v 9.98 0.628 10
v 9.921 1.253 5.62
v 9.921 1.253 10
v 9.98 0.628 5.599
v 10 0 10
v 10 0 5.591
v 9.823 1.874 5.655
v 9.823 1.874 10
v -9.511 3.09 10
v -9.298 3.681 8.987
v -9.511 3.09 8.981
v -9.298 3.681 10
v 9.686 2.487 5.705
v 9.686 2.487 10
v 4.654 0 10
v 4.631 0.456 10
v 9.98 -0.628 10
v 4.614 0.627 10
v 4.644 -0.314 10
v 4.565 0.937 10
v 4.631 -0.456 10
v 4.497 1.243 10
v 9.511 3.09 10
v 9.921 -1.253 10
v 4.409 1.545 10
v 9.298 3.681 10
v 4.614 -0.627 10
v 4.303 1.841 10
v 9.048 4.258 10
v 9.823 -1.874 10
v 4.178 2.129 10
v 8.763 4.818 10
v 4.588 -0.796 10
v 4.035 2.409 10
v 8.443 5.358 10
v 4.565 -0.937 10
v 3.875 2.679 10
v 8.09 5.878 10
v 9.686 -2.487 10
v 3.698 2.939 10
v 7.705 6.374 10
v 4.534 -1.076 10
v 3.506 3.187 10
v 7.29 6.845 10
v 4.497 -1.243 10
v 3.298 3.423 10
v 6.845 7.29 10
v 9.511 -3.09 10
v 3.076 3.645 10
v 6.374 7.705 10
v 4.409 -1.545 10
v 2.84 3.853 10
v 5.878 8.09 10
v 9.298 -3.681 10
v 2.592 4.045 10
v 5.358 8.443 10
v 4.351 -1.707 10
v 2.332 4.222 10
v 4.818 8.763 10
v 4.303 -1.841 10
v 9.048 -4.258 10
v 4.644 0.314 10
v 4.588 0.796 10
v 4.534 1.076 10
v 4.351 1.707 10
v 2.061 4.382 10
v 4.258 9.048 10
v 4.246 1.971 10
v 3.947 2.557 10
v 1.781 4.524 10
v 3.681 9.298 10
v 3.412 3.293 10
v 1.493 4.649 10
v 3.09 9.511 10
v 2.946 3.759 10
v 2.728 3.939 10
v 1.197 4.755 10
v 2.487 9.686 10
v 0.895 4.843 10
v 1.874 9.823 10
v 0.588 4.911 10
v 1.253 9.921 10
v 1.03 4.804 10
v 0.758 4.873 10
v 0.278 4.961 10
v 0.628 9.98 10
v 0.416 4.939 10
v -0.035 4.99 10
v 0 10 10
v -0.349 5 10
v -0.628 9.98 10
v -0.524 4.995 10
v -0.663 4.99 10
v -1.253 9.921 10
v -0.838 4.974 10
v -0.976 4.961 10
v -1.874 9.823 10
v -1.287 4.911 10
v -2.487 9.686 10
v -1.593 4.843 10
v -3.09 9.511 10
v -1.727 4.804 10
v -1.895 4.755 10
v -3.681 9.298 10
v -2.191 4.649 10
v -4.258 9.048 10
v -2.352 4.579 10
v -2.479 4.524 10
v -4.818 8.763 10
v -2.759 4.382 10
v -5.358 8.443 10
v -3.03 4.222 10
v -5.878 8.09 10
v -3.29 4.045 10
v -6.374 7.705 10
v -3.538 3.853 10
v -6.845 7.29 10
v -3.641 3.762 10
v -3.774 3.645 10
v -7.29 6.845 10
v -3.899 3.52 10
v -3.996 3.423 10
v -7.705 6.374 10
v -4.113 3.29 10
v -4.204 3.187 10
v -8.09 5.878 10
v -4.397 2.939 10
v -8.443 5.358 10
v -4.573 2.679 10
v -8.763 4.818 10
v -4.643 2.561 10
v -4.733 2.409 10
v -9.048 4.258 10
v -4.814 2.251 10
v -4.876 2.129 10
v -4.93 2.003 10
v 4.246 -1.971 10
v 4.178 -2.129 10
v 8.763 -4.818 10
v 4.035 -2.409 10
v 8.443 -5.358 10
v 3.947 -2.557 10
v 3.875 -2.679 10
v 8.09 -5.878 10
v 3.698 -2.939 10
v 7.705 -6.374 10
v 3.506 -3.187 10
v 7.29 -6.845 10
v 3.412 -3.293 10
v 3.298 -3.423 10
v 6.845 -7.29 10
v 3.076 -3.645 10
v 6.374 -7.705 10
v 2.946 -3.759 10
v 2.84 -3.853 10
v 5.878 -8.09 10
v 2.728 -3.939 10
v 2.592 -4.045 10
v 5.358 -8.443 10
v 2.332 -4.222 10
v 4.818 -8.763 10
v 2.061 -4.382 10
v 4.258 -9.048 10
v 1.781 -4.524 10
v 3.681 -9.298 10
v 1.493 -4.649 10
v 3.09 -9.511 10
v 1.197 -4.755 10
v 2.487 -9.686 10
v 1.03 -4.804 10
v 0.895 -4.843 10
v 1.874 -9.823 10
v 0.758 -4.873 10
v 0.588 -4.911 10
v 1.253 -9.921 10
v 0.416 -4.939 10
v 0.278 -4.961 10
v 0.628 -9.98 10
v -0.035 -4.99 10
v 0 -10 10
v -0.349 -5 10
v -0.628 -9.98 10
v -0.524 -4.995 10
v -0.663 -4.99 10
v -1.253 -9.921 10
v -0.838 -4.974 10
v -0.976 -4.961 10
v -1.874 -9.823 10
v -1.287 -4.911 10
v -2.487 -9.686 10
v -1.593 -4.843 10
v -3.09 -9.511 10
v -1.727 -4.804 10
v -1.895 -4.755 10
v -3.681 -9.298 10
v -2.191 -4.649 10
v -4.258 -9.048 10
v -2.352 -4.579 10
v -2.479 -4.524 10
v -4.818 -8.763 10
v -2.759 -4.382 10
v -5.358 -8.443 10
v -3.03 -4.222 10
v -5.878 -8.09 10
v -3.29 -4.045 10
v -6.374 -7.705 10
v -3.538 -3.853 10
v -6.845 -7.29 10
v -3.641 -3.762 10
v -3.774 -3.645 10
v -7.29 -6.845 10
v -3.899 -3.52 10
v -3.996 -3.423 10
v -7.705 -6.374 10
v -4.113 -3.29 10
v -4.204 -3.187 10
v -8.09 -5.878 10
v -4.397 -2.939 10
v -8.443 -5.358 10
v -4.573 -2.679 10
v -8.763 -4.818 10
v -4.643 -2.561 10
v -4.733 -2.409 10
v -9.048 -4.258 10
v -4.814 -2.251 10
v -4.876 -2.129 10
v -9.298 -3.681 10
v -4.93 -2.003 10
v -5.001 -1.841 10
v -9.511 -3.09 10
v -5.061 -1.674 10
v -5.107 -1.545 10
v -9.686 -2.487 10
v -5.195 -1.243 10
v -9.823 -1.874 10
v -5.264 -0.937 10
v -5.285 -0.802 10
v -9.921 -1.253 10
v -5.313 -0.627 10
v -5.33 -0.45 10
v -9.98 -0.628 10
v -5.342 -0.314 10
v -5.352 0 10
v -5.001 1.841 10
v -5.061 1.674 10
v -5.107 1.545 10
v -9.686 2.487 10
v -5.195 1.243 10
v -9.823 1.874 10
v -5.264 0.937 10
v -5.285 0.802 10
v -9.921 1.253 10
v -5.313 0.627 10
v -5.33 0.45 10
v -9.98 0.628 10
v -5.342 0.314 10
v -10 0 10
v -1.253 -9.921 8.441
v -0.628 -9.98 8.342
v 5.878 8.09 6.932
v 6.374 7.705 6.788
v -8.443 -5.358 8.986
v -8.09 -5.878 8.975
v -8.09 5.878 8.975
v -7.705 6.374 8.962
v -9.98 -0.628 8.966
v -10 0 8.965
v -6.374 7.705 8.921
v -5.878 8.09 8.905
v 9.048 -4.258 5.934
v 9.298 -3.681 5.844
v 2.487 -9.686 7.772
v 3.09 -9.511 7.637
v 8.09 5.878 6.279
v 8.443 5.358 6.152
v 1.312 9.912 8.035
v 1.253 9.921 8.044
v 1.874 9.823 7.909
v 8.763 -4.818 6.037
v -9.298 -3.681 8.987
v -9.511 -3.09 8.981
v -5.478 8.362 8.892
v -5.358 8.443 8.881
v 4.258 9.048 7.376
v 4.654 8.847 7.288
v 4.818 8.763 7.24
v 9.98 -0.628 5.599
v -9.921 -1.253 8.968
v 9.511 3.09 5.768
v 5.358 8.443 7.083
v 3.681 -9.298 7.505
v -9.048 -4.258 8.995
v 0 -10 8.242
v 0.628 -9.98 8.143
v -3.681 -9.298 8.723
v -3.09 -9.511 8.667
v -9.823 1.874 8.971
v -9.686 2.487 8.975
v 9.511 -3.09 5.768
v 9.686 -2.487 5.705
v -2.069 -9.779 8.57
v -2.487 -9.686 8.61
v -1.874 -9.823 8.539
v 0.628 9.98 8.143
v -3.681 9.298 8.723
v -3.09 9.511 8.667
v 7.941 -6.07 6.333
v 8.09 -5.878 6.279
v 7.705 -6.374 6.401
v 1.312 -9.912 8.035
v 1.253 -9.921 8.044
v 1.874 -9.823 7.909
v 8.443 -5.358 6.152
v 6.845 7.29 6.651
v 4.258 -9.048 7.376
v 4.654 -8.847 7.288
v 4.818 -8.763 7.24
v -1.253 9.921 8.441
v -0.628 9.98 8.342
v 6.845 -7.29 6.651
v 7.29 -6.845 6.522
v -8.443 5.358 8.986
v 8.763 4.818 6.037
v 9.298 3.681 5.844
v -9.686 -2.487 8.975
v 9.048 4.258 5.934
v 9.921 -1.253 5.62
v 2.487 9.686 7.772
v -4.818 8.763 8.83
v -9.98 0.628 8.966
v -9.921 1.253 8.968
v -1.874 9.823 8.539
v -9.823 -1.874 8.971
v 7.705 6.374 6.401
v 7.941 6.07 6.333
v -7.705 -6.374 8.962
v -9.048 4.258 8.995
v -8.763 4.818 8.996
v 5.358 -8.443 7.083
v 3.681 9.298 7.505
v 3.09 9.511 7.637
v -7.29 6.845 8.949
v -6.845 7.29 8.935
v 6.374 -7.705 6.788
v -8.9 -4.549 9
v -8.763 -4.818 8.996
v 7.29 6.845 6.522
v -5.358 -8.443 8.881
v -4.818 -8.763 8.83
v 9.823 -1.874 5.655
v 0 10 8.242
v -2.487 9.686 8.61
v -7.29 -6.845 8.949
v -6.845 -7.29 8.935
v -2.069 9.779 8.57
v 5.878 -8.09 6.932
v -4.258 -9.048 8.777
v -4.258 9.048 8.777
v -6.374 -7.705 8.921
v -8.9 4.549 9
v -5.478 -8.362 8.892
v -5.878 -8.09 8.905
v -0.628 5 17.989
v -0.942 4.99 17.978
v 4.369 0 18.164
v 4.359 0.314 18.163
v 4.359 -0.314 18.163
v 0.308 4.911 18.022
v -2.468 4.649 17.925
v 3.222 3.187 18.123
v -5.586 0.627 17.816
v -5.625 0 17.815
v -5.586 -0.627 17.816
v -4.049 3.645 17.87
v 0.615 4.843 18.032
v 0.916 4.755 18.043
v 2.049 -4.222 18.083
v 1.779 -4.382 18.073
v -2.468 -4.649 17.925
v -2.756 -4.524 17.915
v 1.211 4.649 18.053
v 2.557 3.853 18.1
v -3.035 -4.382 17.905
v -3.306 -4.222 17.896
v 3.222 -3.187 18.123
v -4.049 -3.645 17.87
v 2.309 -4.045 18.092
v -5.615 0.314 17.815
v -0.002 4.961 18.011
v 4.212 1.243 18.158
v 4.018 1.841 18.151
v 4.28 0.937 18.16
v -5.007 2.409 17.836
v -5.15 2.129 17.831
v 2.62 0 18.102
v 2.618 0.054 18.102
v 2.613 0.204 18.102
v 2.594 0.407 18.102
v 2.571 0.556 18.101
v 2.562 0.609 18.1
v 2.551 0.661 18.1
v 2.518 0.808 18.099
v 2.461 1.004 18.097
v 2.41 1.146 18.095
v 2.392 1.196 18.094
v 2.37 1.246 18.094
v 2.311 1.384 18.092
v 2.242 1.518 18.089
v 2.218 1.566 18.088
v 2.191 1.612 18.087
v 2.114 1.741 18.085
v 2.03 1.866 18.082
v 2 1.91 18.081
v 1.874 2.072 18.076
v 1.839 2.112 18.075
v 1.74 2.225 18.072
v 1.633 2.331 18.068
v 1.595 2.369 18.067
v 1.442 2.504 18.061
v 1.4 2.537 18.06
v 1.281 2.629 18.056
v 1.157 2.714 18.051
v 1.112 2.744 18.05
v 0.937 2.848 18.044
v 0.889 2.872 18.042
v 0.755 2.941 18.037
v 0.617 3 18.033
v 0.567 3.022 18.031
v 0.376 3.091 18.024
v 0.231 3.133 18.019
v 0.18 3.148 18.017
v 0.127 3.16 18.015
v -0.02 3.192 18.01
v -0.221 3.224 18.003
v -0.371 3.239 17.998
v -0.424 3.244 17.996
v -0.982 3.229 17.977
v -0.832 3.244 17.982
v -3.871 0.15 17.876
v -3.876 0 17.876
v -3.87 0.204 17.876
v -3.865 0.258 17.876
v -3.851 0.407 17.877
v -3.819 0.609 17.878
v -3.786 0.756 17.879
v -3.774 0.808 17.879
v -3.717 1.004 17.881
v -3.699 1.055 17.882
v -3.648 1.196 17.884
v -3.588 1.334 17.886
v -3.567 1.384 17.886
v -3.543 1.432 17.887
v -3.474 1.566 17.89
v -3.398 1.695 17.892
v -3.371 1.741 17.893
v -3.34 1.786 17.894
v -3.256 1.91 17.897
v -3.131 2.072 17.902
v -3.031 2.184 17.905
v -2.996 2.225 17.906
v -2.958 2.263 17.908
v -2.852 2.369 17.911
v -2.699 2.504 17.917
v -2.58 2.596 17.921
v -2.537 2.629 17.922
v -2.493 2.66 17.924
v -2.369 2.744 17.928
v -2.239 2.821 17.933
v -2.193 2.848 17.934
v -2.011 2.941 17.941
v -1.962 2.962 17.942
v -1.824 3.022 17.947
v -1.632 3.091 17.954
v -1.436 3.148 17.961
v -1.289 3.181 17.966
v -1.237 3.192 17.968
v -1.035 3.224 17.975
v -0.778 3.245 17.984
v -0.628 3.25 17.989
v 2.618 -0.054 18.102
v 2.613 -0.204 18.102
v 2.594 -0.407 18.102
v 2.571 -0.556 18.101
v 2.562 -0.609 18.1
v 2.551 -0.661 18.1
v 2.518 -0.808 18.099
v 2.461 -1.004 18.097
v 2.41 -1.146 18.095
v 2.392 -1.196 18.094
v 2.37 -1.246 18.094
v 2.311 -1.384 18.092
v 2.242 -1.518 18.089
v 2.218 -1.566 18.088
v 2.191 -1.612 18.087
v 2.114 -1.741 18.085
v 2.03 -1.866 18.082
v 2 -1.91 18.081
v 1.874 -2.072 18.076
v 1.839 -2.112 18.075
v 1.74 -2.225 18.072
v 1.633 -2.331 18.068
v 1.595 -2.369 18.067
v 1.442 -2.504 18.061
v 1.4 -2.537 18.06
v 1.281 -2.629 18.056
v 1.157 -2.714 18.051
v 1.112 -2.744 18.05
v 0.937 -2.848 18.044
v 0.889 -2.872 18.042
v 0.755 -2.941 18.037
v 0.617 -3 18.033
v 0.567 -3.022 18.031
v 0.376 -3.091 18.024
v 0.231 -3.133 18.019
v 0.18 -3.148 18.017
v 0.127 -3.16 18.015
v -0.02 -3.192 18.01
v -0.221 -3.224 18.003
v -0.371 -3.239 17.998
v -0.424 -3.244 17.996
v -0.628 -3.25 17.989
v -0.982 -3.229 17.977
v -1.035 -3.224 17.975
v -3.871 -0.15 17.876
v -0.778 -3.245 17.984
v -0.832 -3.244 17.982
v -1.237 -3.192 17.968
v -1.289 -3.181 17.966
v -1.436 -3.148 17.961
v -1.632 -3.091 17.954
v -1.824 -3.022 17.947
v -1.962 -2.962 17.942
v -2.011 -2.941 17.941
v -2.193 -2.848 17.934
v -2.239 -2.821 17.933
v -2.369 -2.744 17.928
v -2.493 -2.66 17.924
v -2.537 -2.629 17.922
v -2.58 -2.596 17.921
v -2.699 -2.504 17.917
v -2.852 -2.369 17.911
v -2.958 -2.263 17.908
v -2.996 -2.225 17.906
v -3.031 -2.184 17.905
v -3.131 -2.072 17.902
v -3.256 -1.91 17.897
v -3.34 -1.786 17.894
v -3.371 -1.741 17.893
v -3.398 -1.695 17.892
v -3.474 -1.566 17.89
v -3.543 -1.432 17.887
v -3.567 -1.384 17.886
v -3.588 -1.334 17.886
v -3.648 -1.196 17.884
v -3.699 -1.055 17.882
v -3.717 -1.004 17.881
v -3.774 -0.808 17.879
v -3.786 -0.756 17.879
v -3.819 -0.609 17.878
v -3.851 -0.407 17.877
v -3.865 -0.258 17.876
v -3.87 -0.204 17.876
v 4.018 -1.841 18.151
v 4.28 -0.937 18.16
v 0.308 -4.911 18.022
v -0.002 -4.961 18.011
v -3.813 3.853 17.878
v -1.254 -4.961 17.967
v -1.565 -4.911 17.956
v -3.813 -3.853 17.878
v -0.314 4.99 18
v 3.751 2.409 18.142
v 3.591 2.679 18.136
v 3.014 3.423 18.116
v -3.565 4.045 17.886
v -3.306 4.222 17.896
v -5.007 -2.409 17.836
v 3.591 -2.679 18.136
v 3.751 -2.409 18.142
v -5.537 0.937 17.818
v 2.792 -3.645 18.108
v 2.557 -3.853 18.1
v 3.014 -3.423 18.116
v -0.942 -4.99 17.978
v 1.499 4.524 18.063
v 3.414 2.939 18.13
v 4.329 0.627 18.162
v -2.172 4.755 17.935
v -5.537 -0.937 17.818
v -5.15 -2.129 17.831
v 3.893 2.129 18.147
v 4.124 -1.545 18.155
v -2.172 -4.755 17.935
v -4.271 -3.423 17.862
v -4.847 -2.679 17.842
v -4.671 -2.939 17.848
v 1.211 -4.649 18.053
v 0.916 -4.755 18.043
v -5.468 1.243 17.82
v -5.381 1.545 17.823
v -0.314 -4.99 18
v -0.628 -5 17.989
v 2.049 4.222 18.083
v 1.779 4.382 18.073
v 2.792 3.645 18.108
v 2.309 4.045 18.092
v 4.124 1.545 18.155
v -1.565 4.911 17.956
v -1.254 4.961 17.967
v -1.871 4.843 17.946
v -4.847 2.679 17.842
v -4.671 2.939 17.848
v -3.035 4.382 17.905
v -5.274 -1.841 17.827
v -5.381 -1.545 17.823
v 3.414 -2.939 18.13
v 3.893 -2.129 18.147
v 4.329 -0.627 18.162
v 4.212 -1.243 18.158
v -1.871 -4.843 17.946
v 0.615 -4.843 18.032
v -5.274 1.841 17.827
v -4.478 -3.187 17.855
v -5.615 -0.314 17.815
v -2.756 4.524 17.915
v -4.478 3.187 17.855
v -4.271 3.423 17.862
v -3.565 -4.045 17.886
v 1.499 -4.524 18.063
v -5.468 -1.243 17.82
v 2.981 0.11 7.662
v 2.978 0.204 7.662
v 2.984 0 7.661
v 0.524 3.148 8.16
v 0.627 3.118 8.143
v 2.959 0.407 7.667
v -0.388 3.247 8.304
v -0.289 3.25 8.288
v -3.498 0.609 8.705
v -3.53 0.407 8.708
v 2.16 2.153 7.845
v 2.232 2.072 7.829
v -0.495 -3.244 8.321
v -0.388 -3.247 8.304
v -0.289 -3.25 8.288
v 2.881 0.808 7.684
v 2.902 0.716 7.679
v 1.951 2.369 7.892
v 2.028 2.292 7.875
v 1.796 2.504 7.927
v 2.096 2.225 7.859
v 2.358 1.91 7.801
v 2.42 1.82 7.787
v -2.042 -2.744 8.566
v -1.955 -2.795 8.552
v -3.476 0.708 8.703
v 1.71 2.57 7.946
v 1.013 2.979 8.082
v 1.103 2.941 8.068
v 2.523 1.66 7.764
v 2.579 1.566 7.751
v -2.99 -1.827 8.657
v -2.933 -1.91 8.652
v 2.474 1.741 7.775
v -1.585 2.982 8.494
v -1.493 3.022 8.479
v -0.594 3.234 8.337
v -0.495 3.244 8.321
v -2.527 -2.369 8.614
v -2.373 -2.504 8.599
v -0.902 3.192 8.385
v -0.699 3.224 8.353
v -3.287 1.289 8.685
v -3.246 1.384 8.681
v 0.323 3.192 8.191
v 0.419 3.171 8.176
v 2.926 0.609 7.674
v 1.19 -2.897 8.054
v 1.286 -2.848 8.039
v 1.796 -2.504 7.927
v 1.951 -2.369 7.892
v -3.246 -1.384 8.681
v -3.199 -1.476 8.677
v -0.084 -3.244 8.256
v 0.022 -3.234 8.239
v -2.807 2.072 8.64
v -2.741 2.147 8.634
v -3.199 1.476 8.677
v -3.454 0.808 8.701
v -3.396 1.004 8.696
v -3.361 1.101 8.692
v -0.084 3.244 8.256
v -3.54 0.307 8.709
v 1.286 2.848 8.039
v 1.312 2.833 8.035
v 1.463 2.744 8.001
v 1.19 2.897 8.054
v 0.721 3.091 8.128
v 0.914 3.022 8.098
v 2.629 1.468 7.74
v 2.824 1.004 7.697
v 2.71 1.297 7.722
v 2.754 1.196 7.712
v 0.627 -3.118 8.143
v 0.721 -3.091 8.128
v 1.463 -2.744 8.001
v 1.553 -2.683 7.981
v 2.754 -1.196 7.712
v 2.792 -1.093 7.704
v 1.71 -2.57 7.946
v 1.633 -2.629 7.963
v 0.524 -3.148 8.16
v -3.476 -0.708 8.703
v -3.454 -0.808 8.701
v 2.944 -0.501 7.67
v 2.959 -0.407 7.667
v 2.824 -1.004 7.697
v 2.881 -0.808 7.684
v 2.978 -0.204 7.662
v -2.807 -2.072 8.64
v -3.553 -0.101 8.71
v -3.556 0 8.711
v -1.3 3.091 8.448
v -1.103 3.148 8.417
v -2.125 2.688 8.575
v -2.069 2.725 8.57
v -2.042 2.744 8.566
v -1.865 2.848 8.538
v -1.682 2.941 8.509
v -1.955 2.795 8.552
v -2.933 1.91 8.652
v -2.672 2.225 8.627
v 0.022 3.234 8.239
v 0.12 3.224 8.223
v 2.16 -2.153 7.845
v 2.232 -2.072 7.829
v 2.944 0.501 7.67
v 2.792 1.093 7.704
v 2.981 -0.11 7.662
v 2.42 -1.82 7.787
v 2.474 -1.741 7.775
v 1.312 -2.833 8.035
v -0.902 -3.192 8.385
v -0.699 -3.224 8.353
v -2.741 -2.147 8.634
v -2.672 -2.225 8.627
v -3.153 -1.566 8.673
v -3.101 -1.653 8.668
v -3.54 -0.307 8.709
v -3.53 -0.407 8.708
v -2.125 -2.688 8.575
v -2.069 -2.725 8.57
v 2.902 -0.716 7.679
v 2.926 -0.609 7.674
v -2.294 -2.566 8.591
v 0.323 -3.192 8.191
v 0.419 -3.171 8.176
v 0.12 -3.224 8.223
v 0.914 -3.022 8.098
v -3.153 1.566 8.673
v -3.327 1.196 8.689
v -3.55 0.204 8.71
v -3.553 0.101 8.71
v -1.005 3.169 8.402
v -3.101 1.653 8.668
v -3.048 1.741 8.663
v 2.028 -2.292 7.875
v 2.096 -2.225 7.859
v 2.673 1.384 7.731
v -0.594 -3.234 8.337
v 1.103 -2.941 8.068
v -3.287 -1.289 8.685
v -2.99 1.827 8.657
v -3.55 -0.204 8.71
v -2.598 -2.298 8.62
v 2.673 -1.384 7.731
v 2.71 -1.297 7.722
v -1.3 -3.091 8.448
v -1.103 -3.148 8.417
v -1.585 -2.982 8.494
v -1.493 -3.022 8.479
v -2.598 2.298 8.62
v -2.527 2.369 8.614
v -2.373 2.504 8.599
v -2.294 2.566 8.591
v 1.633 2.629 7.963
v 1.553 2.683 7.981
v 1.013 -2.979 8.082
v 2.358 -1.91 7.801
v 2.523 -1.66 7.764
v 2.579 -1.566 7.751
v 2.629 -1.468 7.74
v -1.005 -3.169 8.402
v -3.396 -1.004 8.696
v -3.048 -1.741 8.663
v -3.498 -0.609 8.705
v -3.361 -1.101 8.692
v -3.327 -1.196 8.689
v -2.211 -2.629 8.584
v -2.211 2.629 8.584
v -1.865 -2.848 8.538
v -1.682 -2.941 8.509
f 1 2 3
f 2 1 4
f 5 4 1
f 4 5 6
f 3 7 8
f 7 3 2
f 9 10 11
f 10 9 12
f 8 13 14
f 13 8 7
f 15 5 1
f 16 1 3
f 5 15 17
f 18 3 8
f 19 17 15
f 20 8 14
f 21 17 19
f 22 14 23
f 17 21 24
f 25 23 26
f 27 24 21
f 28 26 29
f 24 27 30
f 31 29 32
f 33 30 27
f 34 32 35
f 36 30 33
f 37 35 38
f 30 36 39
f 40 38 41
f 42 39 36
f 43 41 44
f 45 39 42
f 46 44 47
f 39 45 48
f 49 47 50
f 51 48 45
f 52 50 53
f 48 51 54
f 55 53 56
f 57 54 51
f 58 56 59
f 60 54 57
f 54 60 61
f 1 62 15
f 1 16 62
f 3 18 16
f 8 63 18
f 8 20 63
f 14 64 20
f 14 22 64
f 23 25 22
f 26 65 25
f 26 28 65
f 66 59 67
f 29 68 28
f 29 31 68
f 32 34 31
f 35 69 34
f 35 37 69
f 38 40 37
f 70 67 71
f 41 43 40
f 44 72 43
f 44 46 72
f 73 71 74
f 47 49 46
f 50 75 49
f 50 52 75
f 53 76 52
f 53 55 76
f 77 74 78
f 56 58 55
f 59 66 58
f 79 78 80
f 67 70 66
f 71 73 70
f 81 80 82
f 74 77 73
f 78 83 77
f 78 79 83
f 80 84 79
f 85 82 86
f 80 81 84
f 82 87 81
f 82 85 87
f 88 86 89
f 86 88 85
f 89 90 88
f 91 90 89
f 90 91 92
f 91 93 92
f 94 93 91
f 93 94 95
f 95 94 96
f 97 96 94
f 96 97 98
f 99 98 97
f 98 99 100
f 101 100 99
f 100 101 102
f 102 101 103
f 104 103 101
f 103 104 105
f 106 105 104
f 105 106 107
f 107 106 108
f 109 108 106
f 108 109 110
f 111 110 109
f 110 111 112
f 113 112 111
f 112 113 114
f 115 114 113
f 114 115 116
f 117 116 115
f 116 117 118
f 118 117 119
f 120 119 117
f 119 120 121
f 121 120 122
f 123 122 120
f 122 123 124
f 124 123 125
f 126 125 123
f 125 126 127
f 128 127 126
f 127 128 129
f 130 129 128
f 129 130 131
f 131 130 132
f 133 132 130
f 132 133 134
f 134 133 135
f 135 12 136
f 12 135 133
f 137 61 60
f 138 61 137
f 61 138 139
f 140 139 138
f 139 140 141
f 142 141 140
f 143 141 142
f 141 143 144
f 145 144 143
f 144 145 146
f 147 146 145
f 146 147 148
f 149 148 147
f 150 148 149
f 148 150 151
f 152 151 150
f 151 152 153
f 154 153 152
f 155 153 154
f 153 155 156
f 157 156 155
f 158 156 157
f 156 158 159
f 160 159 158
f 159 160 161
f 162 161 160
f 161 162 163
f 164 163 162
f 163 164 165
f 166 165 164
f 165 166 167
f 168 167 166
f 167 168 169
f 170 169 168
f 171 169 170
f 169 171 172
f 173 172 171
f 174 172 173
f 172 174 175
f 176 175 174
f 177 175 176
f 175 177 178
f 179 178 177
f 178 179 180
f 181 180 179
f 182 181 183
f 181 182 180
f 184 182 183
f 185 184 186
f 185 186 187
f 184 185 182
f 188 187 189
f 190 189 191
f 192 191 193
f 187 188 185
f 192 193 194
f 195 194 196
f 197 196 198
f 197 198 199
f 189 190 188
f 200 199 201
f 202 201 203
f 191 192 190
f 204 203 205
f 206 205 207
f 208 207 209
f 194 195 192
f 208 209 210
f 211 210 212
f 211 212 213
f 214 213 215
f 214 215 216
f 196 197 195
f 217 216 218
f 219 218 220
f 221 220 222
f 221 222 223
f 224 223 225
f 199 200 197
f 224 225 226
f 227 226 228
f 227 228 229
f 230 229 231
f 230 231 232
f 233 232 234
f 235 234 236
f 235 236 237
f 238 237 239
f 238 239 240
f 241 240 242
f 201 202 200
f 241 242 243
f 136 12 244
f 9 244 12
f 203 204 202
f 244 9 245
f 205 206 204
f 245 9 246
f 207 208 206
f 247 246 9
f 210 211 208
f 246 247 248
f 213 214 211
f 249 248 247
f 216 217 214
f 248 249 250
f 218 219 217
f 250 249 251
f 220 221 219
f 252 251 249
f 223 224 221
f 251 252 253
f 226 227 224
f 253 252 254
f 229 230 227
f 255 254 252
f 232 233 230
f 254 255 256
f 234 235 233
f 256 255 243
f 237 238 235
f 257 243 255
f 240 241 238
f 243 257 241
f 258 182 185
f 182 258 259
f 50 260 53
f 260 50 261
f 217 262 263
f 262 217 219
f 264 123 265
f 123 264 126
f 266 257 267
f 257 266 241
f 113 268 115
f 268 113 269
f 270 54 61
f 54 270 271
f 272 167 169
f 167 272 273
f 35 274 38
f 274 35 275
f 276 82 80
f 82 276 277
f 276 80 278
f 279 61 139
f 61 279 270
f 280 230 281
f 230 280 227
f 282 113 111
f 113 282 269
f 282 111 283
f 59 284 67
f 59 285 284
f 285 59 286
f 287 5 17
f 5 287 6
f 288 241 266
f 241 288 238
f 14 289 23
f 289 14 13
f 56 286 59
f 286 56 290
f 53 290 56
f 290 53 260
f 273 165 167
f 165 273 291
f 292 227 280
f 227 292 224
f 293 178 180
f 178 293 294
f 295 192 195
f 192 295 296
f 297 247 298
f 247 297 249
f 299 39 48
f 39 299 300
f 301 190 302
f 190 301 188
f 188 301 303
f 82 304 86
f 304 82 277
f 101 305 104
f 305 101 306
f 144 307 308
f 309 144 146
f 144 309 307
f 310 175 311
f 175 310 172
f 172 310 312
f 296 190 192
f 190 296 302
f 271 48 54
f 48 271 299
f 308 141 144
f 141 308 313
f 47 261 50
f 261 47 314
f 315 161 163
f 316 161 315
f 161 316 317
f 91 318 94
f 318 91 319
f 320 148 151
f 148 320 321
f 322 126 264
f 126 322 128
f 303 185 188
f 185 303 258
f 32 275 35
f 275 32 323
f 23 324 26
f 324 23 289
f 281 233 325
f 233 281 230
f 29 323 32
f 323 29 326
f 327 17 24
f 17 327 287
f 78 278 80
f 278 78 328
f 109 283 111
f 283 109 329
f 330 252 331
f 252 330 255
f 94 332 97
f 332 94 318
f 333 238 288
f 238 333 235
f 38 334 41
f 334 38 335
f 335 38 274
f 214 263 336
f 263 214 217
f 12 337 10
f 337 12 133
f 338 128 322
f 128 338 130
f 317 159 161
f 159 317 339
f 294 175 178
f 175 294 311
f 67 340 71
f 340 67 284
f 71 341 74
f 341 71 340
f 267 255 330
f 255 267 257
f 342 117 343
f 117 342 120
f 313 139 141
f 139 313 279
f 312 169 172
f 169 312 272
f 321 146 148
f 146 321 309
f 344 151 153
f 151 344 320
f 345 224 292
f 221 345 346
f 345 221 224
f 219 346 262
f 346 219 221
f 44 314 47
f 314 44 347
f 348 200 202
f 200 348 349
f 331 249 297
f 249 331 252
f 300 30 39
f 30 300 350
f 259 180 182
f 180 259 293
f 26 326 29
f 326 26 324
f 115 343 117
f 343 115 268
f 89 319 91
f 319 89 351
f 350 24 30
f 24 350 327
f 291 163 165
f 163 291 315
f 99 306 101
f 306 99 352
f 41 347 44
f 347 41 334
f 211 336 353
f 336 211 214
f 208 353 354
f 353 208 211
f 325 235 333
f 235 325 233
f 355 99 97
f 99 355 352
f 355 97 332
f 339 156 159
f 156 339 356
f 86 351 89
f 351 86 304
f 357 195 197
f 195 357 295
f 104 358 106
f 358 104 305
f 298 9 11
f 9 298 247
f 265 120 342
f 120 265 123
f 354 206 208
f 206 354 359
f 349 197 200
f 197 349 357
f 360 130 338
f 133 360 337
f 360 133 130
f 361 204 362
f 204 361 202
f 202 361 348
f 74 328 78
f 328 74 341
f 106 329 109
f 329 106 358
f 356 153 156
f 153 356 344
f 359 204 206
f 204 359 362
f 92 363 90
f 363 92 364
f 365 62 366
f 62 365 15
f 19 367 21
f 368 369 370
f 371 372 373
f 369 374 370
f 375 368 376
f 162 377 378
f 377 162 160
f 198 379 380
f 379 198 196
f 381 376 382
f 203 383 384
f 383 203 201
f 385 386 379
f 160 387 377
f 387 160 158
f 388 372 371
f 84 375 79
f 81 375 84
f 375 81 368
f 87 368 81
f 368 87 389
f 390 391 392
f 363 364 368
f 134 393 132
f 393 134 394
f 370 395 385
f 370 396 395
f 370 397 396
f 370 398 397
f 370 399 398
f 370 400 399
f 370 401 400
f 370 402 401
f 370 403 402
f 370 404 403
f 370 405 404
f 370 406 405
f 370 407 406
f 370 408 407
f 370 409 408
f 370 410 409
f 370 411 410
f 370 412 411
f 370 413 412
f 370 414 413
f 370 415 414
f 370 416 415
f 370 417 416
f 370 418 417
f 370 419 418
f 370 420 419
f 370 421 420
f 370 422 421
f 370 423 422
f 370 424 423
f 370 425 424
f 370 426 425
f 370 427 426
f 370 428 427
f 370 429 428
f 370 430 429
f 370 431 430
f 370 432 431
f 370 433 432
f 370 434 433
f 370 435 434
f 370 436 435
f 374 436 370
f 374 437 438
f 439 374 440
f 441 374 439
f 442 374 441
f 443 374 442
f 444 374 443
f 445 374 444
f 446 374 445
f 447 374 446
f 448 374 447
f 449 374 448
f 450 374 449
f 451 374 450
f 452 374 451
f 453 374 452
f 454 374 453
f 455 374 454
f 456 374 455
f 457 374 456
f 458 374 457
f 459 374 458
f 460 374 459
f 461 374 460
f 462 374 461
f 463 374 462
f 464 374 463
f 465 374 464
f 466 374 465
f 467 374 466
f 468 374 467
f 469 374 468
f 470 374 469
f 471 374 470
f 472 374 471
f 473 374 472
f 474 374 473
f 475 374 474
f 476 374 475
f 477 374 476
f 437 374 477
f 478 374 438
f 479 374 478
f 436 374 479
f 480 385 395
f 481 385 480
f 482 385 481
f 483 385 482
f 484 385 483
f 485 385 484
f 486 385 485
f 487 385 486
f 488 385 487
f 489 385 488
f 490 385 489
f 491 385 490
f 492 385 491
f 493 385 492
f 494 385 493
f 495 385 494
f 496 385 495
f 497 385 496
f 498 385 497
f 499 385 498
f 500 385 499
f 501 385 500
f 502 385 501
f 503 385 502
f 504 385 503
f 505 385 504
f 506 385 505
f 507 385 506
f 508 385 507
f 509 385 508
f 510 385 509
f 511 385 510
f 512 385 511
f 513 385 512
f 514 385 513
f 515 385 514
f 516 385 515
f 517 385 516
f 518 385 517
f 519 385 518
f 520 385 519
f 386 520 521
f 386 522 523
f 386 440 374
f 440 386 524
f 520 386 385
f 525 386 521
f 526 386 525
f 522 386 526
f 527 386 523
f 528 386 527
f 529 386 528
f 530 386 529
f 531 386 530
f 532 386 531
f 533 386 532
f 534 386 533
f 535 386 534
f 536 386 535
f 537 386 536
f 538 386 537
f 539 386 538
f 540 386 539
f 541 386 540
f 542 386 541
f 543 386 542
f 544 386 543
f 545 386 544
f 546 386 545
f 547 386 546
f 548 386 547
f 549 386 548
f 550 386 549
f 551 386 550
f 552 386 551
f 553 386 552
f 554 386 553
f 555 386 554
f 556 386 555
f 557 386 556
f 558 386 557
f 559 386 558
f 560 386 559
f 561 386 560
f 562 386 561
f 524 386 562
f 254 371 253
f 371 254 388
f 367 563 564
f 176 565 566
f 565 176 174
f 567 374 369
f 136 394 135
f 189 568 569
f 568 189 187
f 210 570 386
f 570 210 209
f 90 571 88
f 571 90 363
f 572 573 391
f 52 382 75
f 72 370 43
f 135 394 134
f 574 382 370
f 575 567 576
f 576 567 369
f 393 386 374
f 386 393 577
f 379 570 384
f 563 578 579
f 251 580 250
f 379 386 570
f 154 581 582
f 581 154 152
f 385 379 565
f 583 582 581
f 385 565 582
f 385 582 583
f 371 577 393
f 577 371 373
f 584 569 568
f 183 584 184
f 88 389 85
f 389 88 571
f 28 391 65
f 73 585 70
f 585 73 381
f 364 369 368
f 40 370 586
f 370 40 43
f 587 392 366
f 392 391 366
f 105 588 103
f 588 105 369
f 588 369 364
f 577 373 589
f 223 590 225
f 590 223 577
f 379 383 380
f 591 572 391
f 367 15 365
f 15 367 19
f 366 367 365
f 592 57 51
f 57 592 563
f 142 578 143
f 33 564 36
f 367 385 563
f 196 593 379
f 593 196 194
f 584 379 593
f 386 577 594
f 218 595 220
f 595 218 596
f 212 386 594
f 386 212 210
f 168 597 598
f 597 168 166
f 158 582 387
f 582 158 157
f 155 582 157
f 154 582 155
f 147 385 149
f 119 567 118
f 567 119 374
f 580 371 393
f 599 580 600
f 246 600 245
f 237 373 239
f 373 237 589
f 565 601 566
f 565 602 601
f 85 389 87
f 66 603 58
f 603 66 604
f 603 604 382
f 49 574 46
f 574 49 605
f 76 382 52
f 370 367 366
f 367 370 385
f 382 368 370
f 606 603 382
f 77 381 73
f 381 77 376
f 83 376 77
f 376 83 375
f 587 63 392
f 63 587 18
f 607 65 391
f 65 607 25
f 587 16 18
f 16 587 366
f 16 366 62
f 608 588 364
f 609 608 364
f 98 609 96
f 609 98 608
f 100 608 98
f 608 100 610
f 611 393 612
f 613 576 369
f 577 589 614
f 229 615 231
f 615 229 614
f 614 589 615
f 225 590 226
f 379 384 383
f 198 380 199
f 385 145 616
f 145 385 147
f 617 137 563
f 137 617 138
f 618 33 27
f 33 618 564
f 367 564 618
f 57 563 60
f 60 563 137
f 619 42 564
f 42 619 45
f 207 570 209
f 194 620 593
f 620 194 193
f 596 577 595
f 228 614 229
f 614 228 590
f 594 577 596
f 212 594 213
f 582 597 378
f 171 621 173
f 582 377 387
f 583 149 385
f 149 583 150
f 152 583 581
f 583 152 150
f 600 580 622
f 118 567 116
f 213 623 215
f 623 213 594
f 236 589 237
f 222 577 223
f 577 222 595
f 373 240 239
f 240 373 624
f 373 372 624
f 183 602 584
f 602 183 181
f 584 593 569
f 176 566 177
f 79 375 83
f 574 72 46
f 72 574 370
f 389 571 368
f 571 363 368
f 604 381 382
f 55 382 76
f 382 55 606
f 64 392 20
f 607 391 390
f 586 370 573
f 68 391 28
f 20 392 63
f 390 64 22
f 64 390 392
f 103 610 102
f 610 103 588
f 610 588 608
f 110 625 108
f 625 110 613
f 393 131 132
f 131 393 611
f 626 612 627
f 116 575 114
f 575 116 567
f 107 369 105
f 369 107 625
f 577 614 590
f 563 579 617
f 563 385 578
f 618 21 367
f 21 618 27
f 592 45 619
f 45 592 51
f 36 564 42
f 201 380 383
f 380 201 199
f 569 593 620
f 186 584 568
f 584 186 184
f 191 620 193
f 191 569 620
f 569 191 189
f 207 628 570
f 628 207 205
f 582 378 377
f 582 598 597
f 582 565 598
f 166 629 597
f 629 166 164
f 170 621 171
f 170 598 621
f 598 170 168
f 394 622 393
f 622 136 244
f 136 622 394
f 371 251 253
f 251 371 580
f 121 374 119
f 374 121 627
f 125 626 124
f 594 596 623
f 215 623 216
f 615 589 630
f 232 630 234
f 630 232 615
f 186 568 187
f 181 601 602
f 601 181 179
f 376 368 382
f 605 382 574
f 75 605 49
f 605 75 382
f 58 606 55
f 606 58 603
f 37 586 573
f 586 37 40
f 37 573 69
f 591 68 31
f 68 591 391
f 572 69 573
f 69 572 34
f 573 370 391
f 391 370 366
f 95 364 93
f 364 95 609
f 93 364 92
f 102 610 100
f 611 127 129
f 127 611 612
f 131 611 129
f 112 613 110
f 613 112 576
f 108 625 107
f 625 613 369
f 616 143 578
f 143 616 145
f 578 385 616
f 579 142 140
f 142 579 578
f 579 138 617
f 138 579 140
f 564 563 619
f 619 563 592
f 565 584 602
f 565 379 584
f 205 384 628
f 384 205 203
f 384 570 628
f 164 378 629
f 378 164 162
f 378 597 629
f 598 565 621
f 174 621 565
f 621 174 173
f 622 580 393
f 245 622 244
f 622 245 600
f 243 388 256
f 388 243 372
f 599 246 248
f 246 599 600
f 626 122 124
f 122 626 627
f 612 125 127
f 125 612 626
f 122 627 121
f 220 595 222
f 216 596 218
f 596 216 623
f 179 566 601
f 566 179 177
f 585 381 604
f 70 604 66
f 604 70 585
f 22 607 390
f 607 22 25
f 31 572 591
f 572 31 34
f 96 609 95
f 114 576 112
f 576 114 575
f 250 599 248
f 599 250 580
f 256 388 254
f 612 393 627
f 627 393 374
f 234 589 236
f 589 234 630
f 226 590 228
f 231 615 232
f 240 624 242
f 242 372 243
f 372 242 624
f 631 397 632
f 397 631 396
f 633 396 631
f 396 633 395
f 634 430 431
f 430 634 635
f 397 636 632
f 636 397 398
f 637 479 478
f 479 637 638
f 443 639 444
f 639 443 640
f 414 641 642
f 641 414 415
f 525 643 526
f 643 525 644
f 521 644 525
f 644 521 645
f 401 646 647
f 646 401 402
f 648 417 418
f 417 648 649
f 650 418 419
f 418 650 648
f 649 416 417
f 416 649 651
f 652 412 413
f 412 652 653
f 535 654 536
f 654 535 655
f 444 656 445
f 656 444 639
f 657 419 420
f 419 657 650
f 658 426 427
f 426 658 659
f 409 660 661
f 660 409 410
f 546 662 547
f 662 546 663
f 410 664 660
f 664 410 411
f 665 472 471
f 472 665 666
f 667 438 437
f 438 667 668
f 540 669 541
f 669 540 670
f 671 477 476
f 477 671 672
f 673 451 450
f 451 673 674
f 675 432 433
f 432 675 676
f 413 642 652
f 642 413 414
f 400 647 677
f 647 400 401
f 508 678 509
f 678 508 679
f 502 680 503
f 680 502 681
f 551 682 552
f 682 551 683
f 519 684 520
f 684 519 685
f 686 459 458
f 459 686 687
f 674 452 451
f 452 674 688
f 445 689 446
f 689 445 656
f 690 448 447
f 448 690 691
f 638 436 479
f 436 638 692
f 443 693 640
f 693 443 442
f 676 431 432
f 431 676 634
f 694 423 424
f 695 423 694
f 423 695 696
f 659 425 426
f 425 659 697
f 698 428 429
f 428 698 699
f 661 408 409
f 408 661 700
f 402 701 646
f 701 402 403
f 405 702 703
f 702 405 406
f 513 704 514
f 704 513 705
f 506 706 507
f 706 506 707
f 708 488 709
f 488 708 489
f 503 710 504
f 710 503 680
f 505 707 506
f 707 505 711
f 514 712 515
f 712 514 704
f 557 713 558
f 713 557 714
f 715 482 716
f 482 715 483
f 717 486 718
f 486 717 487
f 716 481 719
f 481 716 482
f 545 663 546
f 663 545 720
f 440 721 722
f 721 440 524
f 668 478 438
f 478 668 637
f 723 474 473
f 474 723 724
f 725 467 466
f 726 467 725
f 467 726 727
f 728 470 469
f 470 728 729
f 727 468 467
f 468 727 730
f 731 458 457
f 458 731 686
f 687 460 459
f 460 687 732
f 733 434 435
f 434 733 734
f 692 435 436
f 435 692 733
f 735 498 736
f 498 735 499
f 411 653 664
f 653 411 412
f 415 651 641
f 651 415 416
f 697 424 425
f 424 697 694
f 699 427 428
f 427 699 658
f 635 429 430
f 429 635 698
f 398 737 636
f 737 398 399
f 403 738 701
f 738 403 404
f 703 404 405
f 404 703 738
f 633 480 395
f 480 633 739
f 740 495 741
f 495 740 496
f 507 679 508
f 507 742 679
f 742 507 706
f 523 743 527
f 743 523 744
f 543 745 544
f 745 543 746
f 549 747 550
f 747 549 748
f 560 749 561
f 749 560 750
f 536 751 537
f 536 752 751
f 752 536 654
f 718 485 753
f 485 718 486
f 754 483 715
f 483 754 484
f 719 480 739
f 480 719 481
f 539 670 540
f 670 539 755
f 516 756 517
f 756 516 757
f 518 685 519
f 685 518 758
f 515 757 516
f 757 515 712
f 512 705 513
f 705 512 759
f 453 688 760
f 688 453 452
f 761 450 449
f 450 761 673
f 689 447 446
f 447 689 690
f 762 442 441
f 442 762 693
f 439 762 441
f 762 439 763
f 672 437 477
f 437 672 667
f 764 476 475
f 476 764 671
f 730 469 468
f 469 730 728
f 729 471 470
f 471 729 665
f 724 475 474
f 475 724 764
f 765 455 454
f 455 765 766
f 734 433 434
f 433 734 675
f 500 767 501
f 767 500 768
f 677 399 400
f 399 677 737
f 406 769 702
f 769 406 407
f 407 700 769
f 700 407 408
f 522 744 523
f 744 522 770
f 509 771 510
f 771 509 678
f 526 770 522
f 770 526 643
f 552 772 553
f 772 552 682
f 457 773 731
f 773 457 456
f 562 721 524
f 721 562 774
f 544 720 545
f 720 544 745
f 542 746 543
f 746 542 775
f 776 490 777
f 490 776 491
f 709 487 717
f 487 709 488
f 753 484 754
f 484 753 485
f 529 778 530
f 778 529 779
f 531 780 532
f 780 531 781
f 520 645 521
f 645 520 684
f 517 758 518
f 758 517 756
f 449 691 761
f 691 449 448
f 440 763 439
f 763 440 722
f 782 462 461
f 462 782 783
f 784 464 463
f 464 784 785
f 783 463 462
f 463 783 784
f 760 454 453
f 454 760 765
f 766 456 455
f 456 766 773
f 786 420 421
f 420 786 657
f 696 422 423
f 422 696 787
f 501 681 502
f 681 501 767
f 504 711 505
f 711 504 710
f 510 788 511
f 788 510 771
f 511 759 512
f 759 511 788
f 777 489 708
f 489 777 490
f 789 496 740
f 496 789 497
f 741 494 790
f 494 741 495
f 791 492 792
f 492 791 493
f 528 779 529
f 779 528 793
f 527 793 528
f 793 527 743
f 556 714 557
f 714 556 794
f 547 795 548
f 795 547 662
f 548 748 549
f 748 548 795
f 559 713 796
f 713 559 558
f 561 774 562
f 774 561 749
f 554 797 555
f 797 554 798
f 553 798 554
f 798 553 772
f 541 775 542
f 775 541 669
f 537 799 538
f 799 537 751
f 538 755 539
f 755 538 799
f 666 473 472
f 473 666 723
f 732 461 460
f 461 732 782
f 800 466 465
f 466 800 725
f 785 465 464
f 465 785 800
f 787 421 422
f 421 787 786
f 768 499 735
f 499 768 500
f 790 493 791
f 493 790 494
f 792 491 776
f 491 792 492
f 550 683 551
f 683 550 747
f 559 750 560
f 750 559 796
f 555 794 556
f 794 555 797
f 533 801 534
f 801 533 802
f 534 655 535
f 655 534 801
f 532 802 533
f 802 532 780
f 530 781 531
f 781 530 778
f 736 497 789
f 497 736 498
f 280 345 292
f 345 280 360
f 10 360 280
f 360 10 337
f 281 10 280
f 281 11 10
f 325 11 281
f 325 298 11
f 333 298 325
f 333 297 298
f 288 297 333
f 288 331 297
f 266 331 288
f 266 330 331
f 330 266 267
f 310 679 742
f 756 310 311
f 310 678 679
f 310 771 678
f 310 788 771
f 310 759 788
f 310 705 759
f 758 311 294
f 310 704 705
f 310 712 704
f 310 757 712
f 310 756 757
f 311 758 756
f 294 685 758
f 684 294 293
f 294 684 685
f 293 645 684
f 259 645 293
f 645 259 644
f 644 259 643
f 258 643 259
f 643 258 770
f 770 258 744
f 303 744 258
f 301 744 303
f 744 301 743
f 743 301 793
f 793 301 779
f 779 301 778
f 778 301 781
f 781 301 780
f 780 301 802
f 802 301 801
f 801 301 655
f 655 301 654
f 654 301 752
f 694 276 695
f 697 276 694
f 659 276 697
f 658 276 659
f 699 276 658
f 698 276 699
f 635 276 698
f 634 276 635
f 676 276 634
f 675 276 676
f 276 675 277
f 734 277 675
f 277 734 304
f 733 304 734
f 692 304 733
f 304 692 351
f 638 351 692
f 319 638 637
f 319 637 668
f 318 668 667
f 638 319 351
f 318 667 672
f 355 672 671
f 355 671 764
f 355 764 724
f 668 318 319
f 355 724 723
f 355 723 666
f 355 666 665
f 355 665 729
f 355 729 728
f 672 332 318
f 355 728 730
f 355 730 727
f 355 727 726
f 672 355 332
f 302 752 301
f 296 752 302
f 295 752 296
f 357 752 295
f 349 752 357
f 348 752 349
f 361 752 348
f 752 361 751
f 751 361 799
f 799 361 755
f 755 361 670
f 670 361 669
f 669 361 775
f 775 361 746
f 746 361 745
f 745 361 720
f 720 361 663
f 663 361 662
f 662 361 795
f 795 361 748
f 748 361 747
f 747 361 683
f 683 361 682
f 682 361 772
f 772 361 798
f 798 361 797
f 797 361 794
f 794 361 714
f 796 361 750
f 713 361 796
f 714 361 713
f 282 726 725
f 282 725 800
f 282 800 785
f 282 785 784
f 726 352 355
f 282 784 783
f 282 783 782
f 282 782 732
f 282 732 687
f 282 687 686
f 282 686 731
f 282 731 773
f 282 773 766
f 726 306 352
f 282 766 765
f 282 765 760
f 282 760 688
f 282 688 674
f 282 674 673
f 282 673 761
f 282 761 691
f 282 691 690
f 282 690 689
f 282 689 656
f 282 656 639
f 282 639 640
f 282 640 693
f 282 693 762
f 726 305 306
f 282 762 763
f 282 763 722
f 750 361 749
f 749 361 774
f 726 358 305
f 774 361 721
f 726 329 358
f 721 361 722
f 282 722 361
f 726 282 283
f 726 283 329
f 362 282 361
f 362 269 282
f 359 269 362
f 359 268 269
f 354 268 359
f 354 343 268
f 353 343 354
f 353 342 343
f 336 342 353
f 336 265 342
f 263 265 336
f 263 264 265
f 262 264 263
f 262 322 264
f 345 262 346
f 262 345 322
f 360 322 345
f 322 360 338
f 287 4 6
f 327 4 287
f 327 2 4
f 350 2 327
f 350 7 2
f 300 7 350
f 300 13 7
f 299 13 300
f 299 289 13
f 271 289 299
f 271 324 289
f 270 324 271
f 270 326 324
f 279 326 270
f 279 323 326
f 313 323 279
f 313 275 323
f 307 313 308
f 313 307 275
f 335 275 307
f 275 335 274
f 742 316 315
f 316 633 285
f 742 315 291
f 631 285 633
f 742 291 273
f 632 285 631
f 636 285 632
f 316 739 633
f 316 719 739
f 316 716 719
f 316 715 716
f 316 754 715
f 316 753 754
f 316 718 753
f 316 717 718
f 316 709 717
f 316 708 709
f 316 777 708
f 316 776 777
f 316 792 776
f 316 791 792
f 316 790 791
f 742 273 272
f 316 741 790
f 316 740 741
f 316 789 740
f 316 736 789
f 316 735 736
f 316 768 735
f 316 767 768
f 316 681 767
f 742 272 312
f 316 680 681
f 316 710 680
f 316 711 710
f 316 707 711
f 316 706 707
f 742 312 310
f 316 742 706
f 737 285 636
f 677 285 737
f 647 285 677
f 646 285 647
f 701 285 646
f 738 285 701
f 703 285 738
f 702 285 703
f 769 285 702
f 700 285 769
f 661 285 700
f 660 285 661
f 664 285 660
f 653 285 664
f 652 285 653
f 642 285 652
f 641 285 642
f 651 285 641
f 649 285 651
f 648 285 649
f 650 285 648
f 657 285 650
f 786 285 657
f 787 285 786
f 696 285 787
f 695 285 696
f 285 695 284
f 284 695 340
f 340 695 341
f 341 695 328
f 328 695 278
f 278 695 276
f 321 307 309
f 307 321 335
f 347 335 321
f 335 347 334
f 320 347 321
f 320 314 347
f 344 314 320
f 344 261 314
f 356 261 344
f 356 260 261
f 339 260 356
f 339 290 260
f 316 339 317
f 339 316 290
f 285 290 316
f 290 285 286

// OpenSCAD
// Generated by SolidPython 1.0.4 on 2021-01-28 15:41:12
$fn = 100;


difference() {
	union() {
		cylinder(d = 20, h = 10);
		rotate(a = [0, -2, 0]) {
			cylinder(d = 10, h = 18);
		}
	}
	rotate(a = [0, -2, 0]) {
		translate(v = [0, 0, -10]) {
			cylinder(d = 6.5000000000, h = 38);
		}
	}
	rotate(a = [90, 0, 0]) {
		translate(v = [-8.9000000000, -45.5000000000, -50.0000000000]) {
			cylinder(d = 109, h = 100);
		}
	}
}
/***********************************************
*********      SolidPython code:      **********
************************************************
 
#! /usr/bin/env python

# python audio-jack-support.py

from solid import *
from solid.utils import *

AUDIO_JACK_DIAMETER = 6.5

config = {
    "height": 18,
    "support": {
        "diameter": 10,
        "xAngle": -2,
    },
    "base": {
        "height": 10,
        "diameter": 20,
    },
    "hole": {
        "diameter": AUDIO_JACK_DIAMETER,
    },
    "enclosure": {
        "diameter": 109,
        "xOffset": 8.9,
        "yOffset": 9,
        "visible": False,
        "enabled": True,
    },
}

# -----------------------

class AudioJackSupport():
    def __init__(self, config):
        self.config = config

    def assemble(self):
        jack_support = rotate([0,self.config["support"]["xAngle"],0])(
            cylinder(h = self.config["height"], d=self.config["support"]["diameter"]))
        jack_support_hole = rotate([0,self.config["support"]["xAngle"],0])(
            translate([0, 0, -10])(
                cylinder(h = self.config["height"]+20, d=self.config["hole"]["diameter"])))
        base = cylinder(h = self.config["base"]["height"], d=self.config["base"]["diameter"])

        enclosure_depth = 100
        enclosure = rotate([90,0,0])(
            translate([-self.config["enclosure"]["xOffset"],-(self.config["enclosure"]["diameter"]/2) + self.config["enclosure"]["yOffset"],-enclosure_depth/2])(
                cylinder(h = enclosure_depth, d=self.config["enclosure"]["diameter"])))

        assembly = ((base + jack_support) - jack_support_hole)

        if(self.config["enclosure"]["enabled"]):
            if(self.config["enclosure"]["visible"]):
                assembly += enclosure
            else:
                assembly -= enclosure
        
        return  assembly

if __name__ == '__main__':
    a = AudioJackSupport(config).assemble()
    scad_render_to_file(a, "audio-jack-support.scad", file_header='$fn = 100;', include_orig_code=True)
 
 
************************************************/
